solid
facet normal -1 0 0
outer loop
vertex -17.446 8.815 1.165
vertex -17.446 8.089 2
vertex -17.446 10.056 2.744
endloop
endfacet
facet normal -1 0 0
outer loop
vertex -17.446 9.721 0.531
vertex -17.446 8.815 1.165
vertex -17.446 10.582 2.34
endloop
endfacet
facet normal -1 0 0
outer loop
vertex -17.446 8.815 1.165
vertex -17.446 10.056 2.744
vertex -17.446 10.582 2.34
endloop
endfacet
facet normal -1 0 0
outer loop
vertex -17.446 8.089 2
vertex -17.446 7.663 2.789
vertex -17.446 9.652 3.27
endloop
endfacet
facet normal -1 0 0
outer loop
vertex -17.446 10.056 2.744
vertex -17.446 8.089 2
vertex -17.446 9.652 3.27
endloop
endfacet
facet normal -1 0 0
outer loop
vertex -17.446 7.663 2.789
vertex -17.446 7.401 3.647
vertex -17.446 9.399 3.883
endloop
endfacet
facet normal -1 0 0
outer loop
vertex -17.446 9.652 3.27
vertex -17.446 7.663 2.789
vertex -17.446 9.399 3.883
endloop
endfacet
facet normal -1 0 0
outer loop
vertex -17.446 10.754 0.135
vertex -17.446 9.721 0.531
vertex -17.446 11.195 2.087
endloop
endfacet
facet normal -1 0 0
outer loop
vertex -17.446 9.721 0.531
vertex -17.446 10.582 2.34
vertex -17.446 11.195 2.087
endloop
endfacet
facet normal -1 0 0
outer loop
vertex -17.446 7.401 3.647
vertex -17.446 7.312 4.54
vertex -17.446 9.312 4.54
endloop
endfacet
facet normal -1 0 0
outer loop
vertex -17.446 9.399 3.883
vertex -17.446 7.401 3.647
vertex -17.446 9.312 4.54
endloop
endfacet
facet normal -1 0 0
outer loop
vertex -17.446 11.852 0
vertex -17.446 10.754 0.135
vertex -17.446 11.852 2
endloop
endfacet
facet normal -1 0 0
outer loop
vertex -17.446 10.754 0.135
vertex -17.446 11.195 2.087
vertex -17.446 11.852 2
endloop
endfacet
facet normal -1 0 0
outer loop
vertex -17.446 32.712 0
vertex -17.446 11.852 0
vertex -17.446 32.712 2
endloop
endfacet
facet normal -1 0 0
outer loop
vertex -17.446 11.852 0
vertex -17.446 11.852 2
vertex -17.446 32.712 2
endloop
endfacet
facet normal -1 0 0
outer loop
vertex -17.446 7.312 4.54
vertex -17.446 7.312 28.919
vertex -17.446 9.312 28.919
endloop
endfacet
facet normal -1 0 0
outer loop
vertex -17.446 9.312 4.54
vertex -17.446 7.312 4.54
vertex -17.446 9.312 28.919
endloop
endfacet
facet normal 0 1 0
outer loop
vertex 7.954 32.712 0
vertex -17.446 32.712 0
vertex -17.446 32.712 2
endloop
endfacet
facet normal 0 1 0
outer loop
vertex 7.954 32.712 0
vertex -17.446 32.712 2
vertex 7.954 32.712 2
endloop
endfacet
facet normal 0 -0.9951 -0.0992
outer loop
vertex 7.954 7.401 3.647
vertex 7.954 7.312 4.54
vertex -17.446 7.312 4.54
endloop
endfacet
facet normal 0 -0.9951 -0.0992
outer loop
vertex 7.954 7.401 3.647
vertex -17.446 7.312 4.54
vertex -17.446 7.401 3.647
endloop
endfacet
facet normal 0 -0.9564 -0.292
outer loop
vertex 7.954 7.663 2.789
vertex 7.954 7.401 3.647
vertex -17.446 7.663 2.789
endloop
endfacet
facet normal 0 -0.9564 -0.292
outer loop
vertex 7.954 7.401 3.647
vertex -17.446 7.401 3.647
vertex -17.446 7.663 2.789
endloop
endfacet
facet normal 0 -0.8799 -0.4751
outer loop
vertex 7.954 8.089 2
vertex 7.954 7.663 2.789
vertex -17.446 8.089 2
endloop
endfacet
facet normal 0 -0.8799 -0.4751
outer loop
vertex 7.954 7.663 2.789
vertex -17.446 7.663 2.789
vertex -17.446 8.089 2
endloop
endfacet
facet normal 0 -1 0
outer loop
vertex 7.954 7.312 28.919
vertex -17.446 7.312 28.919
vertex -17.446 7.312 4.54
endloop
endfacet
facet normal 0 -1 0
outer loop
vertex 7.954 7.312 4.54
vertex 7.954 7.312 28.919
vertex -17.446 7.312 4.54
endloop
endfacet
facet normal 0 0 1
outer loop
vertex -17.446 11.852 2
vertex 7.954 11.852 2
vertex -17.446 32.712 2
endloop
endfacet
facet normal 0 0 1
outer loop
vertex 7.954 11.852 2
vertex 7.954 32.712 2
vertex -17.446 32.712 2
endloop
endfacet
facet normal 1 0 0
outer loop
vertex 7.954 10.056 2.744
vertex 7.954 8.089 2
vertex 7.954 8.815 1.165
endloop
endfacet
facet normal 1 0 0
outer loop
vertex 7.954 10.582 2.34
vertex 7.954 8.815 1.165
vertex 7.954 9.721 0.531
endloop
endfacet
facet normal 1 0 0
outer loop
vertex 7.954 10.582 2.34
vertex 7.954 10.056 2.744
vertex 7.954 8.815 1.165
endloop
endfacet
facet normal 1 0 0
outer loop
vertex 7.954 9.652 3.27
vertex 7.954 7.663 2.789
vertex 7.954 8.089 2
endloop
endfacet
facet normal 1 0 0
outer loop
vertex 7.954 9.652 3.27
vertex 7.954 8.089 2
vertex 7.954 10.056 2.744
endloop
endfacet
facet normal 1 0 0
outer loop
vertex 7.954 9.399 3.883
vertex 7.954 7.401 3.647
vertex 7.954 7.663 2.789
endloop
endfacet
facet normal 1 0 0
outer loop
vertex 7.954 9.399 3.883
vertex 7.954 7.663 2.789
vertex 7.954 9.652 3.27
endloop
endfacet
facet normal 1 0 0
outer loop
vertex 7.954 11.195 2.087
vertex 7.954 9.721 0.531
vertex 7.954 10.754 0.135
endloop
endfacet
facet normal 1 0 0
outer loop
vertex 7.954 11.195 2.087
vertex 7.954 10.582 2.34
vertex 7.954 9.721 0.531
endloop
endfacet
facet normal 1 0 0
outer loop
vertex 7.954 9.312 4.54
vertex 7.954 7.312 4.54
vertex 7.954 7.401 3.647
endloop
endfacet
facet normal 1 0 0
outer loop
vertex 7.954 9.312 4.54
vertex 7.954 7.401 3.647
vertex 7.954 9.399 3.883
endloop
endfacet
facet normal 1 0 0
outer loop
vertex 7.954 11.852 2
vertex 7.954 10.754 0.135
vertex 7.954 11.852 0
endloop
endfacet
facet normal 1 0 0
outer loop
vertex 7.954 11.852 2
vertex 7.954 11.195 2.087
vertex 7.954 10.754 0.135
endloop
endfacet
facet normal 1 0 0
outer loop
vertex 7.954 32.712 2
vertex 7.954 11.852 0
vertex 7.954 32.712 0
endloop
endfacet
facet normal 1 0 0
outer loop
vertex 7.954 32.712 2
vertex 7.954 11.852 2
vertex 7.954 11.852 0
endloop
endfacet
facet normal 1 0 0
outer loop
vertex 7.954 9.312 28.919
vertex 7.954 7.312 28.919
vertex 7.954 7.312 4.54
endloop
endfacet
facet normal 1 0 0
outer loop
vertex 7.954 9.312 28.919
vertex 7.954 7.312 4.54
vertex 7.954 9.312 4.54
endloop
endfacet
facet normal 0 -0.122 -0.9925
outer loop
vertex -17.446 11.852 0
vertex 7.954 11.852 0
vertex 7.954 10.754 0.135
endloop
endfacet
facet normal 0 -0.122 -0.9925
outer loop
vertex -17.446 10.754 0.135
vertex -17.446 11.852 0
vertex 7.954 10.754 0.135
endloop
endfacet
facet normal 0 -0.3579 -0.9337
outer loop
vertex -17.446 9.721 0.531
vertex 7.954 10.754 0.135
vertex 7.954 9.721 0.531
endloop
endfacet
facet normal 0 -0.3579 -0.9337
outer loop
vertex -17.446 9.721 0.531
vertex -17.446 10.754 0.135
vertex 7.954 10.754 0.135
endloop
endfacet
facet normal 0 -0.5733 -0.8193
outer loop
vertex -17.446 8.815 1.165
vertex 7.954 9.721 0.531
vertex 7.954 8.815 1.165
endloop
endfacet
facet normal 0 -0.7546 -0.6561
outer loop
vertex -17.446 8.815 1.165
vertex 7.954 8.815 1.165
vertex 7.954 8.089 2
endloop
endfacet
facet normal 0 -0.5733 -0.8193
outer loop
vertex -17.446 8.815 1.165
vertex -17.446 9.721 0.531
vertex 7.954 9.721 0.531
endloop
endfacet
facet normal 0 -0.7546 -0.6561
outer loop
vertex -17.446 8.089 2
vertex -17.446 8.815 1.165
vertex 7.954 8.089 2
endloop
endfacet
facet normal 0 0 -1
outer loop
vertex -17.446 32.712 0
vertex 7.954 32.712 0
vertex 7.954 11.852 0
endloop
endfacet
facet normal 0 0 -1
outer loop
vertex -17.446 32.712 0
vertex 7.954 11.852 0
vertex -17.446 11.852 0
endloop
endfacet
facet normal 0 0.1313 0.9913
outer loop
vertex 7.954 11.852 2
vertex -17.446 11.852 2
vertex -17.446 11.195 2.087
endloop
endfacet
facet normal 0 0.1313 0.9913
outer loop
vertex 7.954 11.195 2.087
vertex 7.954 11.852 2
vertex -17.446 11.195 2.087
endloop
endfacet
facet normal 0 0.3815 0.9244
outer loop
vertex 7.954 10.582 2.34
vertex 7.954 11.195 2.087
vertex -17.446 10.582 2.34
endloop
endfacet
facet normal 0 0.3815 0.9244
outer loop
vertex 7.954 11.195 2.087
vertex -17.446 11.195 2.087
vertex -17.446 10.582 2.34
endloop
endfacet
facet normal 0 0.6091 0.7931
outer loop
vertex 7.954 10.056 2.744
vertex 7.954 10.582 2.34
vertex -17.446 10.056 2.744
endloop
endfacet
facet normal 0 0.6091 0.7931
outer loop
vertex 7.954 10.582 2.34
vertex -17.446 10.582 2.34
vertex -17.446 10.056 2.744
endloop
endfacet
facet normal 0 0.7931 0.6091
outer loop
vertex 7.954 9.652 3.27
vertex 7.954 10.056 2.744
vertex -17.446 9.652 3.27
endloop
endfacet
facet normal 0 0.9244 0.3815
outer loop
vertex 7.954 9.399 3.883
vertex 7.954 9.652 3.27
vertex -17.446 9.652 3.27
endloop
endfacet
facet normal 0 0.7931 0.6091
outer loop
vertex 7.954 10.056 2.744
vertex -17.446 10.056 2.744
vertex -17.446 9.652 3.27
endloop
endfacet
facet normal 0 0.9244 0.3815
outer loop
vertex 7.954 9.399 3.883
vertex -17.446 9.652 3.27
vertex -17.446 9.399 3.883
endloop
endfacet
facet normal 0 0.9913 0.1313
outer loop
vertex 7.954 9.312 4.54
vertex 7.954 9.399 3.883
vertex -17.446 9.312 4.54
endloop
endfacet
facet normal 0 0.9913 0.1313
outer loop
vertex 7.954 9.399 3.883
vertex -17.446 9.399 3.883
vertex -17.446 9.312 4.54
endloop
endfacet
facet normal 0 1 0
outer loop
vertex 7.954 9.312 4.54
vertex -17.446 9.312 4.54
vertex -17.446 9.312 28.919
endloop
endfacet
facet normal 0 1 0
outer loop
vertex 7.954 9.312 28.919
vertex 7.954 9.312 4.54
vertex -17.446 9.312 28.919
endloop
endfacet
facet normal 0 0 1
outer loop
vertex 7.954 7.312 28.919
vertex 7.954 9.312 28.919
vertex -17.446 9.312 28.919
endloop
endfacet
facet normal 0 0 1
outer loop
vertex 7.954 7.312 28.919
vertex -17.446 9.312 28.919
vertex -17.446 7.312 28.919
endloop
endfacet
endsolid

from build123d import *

# Parameters (mm, degrees)
BOSS_EXTRUDE1_DEPTH    = 2
SKETCHED_START         = -17.446464646
SKETCHED_BEND2_DEPTH   = 25.4
SKETCHED_BEND2_2_DEPTH = 25.4


# Read off the part's stored shape, not the designer's step: Sketched Bend2
with BuildPart() as part:
    # Sketch1 → Boss-Extrude1 (new body)
    with BuildSketch(Plane.XY):
        Polygon((-17.446464646, 32.712121212), (7.953535354, 32.712121212), (7.953535354, 7.825252525), (7.953535354, -18.087878788), (-17.446464646, -18.087878788), align=None)
    extrude(amount=BOSS_EXTRUDE1_DEPTH)

    # Sketched Bend2 outline → Sketched Bend2 (cut)
    with BuildSketch(Plane.YZ.offset(SKETCHED_START)):
        with BuildLine():
            ThreePointArc((11.852121212, 0), (9.721393637, 0.531059991), (8.089143668, 2))
            Line((8.089143668, 2), (-18.087878788, 2))
            Line((-18.087878788, 2), (-18.087878788, 0))
            Line((-18.087878788, 0), (11.852121212, 0))
        make_face()
    extrude(amount=SKETCHED_BEND2_DEPTH, mode=Mode.SUBTRACT)

    # Sketched Bend2 2 outline → Sketched Bend2 2 (add)
    with BuildSketch(Plane.YZ.offset(SKETCHED_START)):
        with BuildLine():
            Line((9.312121212, 4.54), (9.312121212, 28.919381003))
            Line((9.312121212, 28.919381003), (7.312121212, 28.919381003))
            Line((7.312121212, 28.919381003), (7.312121212, 4.54))
            ThreePointArc((7.312121212, 4.54), (7.510720629, 3.211903251), (8.089143668, 2))
            Line((8.089143668, 2), (11.852121212, 2))
            ThreePointArc((11.852121212, 2), (10.056069988, 2.743948776), (9.312121212, 4.54))
        make_face()
    extrude(amount=SKETCHED_BEND2_2_DEPTH)


solid = part.part
